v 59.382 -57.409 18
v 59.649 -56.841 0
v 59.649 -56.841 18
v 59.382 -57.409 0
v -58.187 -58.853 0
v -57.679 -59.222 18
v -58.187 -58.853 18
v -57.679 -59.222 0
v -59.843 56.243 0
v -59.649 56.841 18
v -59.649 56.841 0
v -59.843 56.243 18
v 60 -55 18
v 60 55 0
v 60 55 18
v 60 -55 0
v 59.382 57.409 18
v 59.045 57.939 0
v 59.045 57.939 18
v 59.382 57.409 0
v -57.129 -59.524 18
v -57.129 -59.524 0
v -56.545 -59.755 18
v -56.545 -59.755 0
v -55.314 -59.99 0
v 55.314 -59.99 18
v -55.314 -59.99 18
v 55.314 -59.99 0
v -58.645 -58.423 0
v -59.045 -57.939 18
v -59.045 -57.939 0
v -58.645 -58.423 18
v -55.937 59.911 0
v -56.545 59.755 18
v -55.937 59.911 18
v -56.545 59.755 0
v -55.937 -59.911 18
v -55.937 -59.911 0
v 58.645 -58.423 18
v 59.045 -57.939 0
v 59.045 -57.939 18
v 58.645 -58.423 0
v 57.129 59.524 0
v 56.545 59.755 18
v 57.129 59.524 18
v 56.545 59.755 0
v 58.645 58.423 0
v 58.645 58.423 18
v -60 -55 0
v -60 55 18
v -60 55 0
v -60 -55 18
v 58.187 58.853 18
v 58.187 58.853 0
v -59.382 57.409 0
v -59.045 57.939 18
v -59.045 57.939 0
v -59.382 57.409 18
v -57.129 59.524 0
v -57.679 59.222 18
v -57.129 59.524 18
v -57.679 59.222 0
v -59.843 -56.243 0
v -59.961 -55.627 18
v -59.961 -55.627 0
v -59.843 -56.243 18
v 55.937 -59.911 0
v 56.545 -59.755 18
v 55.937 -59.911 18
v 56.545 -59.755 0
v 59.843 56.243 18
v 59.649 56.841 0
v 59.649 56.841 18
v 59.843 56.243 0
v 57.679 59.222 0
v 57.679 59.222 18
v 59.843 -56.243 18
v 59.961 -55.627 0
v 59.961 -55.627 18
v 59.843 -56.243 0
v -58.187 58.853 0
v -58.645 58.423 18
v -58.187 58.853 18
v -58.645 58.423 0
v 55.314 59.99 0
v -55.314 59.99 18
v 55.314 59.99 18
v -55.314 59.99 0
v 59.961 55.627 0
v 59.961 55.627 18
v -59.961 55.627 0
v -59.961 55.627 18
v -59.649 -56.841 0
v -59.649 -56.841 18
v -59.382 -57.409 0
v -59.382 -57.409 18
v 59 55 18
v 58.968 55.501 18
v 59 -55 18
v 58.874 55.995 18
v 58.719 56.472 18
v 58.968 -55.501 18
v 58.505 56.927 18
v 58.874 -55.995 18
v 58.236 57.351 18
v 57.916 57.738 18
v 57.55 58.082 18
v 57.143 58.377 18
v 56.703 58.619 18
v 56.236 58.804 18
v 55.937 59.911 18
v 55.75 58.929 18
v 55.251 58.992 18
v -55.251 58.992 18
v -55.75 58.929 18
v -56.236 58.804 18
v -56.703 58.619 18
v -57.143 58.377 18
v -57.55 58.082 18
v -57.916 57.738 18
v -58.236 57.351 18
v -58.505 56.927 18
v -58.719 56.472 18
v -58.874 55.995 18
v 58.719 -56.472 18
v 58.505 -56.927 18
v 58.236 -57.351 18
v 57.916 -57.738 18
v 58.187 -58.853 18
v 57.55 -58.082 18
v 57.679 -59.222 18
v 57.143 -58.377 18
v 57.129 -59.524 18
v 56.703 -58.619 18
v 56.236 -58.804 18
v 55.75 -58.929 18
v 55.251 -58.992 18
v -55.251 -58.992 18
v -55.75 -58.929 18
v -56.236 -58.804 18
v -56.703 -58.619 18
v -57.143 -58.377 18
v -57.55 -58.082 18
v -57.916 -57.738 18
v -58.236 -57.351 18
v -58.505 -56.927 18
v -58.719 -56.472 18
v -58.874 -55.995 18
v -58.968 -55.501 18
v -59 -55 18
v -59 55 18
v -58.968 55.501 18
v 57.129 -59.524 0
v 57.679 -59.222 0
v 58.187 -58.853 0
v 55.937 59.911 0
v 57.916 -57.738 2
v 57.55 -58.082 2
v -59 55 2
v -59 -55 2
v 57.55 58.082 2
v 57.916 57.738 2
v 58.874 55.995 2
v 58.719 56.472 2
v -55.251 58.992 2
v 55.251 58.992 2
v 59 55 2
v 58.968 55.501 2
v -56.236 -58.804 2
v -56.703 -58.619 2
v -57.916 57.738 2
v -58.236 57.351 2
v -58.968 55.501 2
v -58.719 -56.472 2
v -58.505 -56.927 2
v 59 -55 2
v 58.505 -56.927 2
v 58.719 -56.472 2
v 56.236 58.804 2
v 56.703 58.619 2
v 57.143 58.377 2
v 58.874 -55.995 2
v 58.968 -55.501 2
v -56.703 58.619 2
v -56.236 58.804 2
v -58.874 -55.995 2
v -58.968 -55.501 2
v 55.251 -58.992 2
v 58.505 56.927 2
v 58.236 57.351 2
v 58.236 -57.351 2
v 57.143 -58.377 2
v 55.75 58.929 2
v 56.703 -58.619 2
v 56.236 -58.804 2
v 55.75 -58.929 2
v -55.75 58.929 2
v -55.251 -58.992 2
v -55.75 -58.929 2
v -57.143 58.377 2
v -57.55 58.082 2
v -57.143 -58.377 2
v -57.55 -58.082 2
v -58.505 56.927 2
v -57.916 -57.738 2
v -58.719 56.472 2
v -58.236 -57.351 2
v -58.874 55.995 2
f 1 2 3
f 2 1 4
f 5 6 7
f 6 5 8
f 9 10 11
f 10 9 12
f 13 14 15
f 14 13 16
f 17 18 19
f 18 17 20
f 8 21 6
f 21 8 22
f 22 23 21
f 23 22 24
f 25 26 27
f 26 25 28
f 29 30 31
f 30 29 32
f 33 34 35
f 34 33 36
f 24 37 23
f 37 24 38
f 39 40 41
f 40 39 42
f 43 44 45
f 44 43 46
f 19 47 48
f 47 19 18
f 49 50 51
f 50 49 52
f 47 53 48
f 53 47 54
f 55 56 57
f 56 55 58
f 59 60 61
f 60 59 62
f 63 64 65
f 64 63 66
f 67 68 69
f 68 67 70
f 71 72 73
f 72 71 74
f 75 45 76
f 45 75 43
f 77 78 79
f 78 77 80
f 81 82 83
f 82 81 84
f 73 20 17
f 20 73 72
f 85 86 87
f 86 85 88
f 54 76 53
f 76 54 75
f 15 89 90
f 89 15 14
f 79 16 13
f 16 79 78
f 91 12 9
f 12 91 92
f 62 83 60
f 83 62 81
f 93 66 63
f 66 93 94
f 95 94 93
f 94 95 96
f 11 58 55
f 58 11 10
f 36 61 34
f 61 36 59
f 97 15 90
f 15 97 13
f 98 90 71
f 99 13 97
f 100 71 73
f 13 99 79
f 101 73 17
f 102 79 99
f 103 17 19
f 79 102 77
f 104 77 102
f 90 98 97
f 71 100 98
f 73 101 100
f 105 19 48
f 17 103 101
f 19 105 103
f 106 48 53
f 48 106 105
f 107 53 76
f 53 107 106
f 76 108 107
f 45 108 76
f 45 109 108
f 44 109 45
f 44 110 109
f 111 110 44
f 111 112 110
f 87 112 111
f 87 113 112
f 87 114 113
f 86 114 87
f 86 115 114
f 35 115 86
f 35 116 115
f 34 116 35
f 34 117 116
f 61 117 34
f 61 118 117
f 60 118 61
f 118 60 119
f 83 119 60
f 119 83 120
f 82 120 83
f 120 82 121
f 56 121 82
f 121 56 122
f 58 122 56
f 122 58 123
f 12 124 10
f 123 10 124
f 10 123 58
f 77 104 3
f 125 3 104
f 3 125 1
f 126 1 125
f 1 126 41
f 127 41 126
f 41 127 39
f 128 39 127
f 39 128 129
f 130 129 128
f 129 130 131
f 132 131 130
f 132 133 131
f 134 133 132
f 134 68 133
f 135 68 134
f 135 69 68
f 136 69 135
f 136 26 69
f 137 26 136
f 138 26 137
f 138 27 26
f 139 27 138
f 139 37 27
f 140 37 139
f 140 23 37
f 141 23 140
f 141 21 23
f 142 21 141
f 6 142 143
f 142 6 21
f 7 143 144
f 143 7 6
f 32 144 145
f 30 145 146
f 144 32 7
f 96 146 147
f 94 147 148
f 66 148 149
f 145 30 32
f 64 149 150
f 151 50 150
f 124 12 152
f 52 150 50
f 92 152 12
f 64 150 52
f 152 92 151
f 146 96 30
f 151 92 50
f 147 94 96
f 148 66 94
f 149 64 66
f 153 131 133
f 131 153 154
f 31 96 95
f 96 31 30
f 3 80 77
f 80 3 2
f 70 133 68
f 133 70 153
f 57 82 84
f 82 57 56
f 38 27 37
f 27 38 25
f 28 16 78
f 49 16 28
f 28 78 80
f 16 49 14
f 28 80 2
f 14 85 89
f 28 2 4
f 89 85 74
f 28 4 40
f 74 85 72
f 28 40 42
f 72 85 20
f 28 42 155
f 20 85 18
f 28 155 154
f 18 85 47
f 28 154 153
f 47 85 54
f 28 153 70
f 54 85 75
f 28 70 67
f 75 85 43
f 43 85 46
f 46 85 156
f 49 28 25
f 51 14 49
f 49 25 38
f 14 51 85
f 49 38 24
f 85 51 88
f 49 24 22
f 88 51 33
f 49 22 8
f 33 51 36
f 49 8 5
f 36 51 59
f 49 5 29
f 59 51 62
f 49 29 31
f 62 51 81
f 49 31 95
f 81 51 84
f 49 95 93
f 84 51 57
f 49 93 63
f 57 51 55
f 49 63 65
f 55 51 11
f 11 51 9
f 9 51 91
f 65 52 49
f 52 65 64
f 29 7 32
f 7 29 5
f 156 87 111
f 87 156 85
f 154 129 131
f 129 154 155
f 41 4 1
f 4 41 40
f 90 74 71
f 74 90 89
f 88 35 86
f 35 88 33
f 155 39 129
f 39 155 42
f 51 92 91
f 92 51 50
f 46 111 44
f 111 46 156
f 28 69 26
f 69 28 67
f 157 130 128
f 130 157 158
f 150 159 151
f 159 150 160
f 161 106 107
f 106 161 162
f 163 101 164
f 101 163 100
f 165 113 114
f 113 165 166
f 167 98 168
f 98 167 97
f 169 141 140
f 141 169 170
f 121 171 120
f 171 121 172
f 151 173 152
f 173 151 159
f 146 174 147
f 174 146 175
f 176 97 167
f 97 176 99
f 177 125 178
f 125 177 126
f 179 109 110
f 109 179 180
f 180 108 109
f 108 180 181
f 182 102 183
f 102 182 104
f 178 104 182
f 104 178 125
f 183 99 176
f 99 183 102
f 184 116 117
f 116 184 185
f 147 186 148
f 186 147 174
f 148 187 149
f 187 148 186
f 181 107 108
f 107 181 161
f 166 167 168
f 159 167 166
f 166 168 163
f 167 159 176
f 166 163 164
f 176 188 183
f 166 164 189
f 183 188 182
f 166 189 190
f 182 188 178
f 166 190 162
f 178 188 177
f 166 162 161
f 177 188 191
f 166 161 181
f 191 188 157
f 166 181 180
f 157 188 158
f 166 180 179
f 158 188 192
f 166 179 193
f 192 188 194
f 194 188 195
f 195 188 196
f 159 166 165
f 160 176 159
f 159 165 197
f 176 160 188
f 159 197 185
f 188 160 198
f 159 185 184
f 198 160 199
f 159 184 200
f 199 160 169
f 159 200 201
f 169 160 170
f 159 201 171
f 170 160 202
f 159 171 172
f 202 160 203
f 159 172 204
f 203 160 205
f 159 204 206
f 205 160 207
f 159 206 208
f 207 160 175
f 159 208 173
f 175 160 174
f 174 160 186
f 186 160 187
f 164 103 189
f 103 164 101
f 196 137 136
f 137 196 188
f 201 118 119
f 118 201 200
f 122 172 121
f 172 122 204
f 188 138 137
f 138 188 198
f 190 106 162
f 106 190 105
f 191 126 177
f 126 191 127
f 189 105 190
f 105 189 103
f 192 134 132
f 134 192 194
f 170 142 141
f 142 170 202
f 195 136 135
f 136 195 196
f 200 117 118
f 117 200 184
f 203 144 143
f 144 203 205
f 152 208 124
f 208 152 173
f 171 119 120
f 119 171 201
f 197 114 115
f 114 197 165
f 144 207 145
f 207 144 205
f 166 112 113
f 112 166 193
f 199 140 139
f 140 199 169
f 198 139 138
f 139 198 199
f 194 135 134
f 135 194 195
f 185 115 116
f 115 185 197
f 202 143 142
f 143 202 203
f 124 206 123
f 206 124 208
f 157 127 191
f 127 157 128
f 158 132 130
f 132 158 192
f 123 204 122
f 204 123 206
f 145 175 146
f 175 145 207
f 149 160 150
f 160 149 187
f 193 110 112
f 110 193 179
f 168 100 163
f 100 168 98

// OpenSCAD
$fn = 50;


difference() {
	union() {
		hull() {
			translate(v = [-55.0000000000, 55.0000000000, 0]) {
				cylinder(h = 18, r = 5);
			}
			translate(v = [55.0000000000, 55.0000000000, 0]) {
				cylinder(h = 18, r = 5);
			}
			translate(v = [-55.0000000000, -55.0000000000, 0]) {
				cylinder(h = 18, r = 5);
			}
			translate(v = [55.0000000000, -55.0000000000, 0]) {
				cylinder(h = 18, r = 5);
			}
		}
	}
	union() {
		translate(v = [0, 0, 2]) {
			hull() {
				translate(v = [-55.0000000000, 55.0000000000, 0]) {
					cylinder(h = 16, r = 4);
				}
				translate(v = [55.0000000000, 55.0000000000, 0]) {
					cylinder(h = 16, r = 4);
				}
				translate(v = [-55.0000000000, -55.0000000000, 0]) {
					cylinder(h = 16, r = 4);
				}
				translate(v = [55.0000000000, -55.0000000000, 0]) {
					cylinder(h = 16, r = 4);
				}
			}
		}
	}
}
